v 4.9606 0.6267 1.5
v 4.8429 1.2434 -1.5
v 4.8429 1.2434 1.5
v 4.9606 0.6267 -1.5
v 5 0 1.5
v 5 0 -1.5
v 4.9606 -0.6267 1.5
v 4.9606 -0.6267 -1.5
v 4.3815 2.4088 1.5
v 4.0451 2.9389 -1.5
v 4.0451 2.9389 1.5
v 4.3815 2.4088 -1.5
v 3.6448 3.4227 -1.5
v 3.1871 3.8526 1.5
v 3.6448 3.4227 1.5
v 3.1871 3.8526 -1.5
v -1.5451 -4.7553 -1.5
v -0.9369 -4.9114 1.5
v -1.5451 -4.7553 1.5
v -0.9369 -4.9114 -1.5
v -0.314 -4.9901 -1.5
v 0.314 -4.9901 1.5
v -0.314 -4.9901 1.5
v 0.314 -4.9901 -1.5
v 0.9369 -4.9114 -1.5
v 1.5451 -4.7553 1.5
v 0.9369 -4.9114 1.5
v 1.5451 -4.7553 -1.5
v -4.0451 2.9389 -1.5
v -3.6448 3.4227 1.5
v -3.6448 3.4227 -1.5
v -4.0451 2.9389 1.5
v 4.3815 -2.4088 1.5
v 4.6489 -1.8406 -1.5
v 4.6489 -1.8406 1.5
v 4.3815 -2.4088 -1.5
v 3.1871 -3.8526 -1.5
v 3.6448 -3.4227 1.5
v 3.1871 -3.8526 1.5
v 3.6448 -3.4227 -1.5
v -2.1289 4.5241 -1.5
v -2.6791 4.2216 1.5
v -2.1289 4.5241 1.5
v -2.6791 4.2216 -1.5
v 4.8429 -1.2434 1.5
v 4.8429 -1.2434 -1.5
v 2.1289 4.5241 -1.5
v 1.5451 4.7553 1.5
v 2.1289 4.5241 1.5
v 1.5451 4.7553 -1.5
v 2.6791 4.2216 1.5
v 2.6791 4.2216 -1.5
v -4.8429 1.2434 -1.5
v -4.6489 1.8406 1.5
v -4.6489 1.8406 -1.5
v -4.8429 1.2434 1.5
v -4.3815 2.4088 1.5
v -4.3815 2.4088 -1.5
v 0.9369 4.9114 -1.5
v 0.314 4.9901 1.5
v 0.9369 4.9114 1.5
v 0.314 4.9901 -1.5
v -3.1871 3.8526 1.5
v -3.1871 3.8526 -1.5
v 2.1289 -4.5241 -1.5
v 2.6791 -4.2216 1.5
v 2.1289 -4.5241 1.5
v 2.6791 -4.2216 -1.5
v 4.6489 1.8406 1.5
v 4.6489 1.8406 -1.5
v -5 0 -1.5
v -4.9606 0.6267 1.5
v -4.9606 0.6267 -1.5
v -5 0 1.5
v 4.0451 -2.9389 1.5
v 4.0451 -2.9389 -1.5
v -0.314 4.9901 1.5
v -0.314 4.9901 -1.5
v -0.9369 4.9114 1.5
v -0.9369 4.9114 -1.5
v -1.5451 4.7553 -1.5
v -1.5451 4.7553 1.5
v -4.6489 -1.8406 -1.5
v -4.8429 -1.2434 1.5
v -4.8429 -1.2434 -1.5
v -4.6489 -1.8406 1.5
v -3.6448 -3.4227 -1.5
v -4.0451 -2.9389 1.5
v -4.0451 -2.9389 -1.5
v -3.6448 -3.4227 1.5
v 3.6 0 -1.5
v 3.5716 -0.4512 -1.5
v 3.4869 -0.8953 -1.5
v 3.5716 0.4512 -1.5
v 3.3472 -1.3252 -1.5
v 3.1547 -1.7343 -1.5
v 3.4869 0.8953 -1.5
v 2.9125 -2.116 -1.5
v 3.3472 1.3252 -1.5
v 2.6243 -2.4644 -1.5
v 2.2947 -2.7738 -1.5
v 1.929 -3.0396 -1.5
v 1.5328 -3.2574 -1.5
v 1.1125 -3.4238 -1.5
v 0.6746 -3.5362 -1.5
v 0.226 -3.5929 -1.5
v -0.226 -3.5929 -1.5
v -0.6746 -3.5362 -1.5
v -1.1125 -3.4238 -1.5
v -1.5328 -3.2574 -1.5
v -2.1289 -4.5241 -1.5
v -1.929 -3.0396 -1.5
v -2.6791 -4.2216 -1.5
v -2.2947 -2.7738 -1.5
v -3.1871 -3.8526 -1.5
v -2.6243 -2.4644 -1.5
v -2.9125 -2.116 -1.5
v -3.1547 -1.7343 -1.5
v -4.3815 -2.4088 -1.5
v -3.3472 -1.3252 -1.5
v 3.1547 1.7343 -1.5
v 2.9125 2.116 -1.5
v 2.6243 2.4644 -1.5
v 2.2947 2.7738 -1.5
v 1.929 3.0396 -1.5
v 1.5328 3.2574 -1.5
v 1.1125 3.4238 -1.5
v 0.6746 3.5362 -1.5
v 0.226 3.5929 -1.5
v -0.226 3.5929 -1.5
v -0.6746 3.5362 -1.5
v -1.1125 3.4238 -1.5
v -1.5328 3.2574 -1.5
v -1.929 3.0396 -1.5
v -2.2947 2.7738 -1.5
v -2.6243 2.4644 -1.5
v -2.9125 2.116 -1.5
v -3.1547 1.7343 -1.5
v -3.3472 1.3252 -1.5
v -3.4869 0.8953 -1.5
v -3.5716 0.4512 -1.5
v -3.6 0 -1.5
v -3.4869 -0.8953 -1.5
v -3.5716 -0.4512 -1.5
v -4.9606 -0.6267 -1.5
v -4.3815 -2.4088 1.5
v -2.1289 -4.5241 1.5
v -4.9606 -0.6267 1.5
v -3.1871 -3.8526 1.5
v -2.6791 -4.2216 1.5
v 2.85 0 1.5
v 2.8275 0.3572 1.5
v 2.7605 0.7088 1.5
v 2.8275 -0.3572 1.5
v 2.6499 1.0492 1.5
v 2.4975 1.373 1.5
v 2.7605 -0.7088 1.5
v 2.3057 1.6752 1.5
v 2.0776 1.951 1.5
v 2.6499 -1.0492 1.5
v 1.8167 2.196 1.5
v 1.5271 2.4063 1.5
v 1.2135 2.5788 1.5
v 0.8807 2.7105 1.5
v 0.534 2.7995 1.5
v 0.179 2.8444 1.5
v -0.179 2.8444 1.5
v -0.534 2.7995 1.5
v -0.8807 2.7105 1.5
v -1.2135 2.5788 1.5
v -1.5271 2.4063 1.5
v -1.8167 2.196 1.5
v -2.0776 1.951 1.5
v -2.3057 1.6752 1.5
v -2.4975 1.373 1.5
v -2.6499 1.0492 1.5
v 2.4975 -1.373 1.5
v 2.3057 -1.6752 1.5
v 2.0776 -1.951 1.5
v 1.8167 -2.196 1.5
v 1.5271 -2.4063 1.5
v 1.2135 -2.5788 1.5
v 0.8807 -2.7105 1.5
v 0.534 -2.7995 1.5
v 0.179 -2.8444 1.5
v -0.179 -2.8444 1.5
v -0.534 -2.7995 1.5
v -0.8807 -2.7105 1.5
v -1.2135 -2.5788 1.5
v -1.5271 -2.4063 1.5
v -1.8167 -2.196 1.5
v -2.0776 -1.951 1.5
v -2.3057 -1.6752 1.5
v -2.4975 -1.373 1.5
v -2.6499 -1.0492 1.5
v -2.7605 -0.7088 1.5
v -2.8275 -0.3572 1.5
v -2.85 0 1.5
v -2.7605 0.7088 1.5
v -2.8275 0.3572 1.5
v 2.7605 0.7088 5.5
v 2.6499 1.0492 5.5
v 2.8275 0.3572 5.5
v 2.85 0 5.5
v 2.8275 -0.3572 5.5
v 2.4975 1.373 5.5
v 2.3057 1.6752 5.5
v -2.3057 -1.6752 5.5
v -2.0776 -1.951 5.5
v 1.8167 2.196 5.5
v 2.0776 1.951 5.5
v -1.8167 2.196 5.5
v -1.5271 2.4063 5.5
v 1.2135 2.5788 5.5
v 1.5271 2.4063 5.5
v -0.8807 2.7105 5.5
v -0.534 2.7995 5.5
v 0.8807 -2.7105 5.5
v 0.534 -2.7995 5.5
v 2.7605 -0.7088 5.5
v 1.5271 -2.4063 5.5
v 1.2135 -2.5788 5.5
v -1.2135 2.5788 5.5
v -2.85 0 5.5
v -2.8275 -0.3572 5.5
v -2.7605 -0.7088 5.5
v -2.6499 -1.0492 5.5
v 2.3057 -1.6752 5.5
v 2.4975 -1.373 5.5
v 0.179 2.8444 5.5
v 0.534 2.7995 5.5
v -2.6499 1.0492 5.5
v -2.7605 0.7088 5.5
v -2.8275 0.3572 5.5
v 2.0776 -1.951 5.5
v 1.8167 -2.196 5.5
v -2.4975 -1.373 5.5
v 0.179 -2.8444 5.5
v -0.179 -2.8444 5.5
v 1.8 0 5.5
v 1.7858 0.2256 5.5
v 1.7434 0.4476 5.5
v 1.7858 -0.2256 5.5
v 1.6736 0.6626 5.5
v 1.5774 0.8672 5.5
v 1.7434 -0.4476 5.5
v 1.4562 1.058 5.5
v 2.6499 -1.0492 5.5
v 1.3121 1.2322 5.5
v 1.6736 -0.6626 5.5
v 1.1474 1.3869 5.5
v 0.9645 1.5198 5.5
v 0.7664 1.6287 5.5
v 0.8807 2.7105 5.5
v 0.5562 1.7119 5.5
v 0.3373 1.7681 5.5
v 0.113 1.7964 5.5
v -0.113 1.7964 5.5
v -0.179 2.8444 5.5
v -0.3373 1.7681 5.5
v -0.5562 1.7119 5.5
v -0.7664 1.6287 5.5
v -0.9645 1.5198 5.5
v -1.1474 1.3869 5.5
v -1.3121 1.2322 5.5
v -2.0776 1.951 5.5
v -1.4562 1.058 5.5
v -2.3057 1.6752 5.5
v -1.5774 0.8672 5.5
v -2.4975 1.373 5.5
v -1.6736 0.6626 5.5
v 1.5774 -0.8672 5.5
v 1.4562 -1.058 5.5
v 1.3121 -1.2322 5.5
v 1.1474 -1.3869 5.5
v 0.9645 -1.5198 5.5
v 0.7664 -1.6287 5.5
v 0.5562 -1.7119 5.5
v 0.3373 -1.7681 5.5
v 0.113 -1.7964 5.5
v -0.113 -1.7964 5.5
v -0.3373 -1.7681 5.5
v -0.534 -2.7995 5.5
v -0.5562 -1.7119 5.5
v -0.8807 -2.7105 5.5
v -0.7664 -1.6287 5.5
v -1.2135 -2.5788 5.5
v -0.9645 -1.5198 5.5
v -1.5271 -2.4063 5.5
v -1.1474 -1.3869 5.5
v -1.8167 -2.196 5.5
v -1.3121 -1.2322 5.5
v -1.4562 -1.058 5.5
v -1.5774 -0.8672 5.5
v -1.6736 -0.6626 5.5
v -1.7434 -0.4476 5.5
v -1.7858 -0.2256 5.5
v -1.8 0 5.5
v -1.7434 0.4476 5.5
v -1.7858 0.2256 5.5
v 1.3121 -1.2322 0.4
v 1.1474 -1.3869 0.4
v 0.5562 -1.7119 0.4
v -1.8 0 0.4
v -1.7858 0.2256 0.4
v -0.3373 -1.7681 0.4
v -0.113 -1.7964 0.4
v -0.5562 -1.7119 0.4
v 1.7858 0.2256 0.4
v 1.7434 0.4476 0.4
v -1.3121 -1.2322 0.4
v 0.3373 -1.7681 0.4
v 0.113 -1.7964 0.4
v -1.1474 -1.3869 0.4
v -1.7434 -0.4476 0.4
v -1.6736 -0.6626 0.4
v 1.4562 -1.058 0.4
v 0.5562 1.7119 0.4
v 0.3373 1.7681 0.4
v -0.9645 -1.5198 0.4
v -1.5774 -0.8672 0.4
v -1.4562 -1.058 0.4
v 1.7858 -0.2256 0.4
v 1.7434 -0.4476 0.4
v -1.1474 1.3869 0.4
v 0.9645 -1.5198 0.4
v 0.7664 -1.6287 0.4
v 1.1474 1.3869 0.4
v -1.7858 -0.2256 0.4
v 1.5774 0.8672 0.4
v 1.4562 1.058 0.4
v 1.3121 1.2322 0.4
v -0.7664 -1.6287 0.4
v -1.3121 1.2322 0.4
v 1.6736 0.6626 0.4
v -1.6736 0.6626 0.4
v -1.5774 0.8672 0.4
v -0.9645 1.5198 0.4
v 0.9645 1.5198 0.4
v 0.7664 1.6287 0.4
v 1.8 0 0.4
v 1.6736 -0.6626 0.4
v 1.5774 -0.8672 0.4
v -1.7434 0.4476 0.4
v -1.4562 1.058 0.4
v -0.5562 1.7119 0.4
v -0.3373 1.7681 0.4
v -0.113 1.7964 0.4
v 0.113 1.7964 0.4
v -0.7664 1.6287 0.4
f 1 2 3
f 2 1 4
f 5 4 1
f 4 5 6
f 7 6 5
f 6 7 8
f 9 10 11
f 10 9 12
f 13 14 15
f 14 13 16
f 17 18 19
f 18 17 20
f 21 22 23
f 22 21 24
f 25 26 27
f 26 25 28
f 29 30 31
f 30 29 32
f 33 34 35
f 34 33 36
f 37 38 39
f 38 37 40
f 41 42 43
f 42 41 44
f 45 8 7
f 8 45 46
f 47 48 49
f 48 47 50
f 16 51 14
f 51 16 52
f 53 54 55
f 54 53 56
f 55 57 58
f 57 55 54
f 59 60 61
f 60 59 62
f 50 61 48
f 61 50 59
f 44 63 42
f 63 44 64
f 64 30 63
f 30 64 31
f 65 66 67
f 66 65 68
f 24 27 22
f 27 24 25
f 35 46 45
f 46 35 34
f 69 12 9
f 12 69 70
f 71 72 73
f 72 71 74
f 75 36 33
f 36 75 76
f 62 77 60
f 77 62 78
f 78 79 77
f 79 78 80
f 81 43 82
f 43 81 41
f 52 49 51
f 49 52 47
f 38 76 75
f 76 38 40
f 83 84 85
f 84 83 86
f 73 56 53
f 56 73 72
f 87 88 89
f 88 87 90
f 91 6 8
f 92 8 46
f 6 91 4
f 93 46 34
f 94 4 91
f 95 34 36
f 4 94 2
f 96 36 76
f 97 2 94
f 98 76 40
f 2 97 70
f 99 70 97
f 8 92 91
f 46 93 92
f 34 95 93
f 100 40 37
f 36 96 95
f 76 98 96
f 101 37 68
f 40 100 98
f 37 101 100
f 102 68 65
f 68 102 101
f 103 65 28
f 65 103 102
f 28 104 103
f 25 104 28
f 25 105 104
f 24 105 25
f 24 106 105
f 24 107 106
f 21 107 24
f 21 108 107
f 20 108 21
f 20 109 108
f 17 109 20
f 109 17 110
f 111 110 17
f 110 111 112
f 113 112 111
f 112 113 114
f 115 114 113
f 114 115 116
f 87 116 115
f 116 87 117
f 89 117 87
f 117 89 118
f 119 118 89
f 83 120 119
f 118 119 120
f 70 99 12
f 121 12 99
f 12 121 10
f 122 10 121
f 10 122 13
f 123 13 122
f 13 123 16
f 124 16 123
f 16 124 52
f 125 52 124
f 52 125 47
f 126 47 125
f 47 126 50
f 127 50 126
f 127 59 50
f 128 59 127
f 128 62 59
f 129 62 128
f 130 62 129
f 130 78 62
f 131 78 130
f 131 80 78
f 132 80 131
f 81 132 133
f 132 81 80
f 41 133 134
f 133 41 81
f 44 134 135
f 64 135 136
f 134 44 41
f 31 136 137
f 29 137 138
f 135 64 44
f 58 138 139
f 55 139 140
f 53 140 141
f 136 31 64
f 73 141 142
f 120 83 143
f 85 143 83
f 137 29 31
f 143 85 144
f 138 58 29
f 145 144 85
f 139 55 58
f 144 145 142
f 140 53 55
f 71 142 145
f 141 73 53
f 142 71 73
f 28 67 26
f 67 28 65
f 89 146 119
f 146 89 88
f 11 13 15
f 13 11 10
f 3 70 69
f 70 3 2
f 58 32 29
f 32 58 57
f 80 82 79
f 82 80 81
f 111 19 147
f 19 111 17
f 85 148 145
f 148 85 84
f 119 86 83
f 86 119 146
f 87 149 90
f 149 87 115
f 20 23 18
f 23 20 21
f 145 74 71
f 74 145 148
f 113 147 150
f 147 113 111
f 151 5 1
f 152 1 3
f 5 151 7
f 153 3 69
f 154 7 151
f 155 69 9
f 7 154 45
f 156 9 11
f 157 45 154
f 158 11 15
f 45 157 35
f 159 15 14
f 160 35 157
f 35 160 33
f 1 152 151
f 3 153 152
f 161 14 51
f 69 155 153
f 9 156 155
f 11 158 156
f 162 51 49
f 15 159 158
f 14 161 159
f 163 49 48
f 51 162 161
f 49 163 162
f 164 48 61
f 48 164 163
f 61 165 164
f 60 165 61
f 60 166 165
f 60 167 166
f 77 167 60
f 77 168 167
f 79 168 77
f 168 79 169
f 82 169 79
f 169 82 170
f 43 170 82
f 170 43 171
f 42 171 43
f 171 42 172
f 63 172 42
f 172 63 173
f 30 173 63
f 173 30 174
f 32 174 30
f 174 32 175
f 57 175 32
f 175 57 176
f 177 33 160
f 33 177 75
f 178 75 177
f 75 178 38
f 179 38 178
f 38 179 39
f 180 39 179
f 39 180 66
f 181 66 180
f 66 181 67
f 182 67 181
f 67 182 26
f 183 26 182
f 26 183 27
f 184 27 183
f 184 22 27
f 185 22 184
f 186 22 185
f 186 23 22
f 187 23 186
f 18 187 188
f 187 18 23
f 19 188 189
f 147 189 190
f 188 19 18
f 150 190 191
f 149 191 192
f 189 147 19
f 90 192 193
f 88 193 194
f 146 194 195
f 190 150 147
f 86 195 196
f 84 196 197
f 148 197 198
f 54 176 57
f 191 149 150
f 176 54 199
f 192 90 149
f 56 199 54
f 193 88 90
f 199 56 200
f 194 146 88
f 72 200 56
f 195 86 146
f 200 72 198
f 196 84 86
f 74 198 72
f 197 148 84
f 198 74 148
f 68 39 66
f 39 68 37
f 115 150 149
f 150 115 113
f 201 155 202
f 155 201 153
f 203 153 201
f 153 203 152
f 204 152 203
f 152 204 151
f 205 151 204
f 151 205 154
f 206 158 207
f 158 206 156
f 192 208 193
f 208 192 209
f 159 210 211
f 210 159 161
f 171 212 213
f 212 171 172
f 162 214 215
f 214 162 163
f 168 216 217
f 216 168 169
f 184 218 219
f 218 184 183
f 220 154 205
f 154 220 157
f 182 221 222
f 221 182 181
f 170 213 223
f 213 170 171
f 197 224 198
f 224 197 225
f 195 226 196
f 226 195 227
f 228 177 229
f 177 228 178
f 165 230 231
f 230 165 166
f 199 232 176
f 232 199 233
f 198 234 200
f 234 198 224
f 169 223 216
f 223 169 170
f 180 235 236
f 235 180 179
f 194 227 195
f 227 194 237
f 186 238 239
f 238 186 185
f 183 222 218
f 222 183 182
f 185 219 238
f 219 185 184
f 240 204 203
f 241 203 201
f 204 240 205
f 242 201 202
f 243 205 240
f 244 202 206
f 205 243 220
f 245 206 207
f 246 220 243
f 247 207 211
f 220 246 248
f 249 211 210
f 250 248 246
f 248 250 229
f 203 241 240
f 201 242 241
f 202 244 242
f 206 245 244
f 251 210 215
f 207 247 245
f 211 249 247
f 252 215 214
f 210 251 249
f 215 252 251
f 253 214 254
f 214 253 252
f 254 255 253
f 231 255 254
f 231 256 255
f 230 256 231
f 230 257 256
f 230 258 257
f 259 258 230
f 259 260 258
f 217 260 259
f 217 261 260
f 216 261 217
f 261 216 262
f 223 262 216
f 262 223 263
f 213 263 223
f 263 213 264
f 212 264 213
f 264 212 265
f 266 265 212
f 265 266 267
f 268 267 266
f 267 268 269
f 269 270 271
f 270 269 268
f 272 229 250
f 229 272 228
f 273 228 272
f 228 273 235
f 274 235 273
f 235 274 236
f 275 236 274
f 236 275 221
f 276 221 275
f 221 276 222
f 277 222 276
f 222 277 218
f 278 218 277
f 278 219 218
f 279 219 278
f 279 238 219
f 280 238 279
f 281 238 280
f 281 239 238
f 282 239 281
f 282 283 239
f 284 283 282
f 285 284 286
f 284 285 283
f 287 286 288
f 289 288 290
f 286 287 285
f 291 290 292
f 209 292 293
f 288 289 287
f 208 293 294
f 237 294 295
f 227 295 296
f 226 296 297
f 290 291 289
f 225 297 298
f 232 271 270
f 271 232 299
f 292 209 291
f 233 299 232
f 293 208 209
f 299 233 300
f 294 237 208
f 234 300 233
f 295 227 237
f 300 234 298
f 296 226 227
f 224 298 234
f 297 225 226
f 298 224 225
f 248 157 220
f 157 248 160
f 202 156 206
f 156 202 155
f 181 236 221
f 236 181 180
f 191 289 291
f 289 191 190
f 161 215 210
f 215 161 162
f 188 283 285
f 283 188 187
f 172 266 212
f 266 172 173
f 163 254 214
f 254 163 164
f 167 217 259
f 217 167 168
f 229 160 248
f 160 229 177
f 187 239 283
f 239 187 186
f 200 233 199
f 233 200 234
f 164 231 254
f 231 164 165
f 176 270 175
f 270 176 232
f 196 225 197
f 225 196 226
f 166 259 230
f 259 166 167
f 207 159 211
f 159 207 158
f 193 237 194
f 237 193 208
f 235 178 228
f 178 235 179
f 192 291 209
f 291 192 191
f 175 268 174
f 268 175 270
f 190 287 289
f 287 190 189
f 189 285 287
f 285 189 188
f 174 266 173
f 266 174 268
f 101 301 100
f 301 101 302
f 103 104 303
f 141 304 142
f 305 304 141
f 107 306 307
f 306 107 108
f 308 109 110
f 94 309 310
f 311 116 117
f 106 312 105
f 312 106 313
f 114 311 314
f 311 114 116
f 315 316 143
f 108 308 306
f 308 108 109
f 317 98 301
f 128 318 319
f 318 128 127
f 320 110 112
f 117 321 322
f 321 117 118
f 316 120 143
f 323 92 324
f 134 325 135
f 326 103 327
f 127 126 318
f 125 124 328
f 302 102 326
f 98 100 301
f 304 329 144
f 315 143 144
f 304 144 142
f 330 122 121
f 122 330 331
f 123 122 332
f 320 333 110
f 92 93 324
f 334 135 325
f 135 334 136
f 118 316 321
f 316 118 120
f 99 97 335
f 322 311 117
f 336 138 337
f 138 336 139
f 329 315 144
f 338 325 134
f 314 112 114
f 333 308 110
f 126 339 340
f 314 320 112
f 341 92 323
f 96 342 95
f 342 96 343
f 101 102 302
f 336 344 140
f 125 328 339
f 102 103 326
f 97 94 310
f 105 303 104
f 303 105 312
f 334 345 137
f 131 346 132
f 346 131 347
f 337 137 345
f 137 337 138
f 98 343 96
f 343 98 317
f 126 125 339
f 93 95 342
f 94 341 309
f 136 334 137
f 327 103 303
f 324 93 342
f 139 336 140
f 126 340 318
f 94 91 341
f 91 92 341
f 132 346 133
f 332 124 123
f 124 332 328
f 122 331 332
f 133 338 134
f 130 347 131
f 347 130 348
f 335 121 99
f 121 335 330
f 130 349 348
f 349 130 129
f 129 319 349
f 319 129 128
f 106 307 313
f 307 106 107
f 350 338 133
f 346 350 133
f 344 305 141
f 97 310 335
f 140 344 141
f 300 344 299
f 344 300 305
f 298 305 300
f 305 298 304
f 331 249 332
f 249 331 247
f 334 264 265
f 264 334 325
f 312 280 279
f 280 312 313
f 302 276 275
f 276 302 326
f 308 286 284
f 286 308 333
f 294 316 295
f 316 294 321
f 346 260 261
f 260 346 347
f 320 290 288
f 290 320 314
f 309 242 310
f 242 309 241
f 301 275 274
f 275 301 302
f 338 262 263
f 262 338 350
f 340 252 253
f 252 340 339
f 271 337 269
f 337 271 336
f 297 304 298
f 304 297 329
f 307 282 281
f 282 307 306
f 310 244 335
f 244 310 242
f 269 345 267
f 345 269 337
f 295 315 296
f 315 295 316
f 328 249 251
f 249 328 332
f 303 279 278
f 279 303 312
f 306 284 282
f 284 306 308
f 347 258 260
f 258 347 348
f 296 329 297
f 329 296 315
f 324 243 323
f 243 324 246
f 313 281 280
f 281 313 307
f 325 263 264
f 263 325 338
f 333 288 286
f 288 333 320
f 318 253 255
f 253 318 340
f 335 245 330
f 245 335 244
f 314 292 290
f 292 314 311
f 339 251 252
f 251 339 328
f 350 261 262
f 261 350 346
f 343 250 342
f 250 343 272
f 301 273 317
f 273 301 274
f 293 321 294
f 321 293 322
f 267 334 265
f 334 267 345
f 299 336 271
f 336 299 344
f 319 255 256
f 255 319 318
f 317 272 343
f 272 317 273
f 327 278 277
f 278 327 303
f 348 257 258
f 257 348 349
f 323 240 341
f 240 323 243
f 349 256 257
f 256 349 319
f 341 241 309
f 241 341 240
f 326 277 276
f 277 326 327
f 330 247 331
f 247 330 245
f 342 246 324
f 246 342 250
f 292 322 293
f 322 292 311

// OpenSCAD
$fn = 50;


difference() {
	union() {
		translate(v = [0, 0, -1.5000000000]) {
			cylinder(h = 3, r = 5.0000000000);
		}
		translate(v = [0, 0, -1.5000000000]) {
			cylinder(h = 7, r = 2.8500000000);
		}
	}
	union() {
		translate(v = [0, 0, -1.5000000000]) {
			rotate(a = [0, 180, 0]) {
				difference() {
					union() {
						translate(v = [0, 0, -7.0000000000]) {
							cylinder(h = 7, r = 1.5000000000);
						}
						translate(v = [0, 0, -1.9000000000]) {
							cylinder(h = 1.9000000000, r1 = 1.8000000000, r2 = 3.6000000000);
						}
						translate(v = [0, 0, -7.0000000000]) {
							cylinder(h = 7, r = 1.8000000000);
						}
						translate(v = [0, 0, -7.0000000000]) {
							cylinder(h = 7, r = 1.5000000000);
						}
					}
					union();
				}
			}
		}
		translate(v = [0, 0, -50.0000000000]) {
			cylinder(h = 100, r = 1.8000000000);
		}
	}
}
